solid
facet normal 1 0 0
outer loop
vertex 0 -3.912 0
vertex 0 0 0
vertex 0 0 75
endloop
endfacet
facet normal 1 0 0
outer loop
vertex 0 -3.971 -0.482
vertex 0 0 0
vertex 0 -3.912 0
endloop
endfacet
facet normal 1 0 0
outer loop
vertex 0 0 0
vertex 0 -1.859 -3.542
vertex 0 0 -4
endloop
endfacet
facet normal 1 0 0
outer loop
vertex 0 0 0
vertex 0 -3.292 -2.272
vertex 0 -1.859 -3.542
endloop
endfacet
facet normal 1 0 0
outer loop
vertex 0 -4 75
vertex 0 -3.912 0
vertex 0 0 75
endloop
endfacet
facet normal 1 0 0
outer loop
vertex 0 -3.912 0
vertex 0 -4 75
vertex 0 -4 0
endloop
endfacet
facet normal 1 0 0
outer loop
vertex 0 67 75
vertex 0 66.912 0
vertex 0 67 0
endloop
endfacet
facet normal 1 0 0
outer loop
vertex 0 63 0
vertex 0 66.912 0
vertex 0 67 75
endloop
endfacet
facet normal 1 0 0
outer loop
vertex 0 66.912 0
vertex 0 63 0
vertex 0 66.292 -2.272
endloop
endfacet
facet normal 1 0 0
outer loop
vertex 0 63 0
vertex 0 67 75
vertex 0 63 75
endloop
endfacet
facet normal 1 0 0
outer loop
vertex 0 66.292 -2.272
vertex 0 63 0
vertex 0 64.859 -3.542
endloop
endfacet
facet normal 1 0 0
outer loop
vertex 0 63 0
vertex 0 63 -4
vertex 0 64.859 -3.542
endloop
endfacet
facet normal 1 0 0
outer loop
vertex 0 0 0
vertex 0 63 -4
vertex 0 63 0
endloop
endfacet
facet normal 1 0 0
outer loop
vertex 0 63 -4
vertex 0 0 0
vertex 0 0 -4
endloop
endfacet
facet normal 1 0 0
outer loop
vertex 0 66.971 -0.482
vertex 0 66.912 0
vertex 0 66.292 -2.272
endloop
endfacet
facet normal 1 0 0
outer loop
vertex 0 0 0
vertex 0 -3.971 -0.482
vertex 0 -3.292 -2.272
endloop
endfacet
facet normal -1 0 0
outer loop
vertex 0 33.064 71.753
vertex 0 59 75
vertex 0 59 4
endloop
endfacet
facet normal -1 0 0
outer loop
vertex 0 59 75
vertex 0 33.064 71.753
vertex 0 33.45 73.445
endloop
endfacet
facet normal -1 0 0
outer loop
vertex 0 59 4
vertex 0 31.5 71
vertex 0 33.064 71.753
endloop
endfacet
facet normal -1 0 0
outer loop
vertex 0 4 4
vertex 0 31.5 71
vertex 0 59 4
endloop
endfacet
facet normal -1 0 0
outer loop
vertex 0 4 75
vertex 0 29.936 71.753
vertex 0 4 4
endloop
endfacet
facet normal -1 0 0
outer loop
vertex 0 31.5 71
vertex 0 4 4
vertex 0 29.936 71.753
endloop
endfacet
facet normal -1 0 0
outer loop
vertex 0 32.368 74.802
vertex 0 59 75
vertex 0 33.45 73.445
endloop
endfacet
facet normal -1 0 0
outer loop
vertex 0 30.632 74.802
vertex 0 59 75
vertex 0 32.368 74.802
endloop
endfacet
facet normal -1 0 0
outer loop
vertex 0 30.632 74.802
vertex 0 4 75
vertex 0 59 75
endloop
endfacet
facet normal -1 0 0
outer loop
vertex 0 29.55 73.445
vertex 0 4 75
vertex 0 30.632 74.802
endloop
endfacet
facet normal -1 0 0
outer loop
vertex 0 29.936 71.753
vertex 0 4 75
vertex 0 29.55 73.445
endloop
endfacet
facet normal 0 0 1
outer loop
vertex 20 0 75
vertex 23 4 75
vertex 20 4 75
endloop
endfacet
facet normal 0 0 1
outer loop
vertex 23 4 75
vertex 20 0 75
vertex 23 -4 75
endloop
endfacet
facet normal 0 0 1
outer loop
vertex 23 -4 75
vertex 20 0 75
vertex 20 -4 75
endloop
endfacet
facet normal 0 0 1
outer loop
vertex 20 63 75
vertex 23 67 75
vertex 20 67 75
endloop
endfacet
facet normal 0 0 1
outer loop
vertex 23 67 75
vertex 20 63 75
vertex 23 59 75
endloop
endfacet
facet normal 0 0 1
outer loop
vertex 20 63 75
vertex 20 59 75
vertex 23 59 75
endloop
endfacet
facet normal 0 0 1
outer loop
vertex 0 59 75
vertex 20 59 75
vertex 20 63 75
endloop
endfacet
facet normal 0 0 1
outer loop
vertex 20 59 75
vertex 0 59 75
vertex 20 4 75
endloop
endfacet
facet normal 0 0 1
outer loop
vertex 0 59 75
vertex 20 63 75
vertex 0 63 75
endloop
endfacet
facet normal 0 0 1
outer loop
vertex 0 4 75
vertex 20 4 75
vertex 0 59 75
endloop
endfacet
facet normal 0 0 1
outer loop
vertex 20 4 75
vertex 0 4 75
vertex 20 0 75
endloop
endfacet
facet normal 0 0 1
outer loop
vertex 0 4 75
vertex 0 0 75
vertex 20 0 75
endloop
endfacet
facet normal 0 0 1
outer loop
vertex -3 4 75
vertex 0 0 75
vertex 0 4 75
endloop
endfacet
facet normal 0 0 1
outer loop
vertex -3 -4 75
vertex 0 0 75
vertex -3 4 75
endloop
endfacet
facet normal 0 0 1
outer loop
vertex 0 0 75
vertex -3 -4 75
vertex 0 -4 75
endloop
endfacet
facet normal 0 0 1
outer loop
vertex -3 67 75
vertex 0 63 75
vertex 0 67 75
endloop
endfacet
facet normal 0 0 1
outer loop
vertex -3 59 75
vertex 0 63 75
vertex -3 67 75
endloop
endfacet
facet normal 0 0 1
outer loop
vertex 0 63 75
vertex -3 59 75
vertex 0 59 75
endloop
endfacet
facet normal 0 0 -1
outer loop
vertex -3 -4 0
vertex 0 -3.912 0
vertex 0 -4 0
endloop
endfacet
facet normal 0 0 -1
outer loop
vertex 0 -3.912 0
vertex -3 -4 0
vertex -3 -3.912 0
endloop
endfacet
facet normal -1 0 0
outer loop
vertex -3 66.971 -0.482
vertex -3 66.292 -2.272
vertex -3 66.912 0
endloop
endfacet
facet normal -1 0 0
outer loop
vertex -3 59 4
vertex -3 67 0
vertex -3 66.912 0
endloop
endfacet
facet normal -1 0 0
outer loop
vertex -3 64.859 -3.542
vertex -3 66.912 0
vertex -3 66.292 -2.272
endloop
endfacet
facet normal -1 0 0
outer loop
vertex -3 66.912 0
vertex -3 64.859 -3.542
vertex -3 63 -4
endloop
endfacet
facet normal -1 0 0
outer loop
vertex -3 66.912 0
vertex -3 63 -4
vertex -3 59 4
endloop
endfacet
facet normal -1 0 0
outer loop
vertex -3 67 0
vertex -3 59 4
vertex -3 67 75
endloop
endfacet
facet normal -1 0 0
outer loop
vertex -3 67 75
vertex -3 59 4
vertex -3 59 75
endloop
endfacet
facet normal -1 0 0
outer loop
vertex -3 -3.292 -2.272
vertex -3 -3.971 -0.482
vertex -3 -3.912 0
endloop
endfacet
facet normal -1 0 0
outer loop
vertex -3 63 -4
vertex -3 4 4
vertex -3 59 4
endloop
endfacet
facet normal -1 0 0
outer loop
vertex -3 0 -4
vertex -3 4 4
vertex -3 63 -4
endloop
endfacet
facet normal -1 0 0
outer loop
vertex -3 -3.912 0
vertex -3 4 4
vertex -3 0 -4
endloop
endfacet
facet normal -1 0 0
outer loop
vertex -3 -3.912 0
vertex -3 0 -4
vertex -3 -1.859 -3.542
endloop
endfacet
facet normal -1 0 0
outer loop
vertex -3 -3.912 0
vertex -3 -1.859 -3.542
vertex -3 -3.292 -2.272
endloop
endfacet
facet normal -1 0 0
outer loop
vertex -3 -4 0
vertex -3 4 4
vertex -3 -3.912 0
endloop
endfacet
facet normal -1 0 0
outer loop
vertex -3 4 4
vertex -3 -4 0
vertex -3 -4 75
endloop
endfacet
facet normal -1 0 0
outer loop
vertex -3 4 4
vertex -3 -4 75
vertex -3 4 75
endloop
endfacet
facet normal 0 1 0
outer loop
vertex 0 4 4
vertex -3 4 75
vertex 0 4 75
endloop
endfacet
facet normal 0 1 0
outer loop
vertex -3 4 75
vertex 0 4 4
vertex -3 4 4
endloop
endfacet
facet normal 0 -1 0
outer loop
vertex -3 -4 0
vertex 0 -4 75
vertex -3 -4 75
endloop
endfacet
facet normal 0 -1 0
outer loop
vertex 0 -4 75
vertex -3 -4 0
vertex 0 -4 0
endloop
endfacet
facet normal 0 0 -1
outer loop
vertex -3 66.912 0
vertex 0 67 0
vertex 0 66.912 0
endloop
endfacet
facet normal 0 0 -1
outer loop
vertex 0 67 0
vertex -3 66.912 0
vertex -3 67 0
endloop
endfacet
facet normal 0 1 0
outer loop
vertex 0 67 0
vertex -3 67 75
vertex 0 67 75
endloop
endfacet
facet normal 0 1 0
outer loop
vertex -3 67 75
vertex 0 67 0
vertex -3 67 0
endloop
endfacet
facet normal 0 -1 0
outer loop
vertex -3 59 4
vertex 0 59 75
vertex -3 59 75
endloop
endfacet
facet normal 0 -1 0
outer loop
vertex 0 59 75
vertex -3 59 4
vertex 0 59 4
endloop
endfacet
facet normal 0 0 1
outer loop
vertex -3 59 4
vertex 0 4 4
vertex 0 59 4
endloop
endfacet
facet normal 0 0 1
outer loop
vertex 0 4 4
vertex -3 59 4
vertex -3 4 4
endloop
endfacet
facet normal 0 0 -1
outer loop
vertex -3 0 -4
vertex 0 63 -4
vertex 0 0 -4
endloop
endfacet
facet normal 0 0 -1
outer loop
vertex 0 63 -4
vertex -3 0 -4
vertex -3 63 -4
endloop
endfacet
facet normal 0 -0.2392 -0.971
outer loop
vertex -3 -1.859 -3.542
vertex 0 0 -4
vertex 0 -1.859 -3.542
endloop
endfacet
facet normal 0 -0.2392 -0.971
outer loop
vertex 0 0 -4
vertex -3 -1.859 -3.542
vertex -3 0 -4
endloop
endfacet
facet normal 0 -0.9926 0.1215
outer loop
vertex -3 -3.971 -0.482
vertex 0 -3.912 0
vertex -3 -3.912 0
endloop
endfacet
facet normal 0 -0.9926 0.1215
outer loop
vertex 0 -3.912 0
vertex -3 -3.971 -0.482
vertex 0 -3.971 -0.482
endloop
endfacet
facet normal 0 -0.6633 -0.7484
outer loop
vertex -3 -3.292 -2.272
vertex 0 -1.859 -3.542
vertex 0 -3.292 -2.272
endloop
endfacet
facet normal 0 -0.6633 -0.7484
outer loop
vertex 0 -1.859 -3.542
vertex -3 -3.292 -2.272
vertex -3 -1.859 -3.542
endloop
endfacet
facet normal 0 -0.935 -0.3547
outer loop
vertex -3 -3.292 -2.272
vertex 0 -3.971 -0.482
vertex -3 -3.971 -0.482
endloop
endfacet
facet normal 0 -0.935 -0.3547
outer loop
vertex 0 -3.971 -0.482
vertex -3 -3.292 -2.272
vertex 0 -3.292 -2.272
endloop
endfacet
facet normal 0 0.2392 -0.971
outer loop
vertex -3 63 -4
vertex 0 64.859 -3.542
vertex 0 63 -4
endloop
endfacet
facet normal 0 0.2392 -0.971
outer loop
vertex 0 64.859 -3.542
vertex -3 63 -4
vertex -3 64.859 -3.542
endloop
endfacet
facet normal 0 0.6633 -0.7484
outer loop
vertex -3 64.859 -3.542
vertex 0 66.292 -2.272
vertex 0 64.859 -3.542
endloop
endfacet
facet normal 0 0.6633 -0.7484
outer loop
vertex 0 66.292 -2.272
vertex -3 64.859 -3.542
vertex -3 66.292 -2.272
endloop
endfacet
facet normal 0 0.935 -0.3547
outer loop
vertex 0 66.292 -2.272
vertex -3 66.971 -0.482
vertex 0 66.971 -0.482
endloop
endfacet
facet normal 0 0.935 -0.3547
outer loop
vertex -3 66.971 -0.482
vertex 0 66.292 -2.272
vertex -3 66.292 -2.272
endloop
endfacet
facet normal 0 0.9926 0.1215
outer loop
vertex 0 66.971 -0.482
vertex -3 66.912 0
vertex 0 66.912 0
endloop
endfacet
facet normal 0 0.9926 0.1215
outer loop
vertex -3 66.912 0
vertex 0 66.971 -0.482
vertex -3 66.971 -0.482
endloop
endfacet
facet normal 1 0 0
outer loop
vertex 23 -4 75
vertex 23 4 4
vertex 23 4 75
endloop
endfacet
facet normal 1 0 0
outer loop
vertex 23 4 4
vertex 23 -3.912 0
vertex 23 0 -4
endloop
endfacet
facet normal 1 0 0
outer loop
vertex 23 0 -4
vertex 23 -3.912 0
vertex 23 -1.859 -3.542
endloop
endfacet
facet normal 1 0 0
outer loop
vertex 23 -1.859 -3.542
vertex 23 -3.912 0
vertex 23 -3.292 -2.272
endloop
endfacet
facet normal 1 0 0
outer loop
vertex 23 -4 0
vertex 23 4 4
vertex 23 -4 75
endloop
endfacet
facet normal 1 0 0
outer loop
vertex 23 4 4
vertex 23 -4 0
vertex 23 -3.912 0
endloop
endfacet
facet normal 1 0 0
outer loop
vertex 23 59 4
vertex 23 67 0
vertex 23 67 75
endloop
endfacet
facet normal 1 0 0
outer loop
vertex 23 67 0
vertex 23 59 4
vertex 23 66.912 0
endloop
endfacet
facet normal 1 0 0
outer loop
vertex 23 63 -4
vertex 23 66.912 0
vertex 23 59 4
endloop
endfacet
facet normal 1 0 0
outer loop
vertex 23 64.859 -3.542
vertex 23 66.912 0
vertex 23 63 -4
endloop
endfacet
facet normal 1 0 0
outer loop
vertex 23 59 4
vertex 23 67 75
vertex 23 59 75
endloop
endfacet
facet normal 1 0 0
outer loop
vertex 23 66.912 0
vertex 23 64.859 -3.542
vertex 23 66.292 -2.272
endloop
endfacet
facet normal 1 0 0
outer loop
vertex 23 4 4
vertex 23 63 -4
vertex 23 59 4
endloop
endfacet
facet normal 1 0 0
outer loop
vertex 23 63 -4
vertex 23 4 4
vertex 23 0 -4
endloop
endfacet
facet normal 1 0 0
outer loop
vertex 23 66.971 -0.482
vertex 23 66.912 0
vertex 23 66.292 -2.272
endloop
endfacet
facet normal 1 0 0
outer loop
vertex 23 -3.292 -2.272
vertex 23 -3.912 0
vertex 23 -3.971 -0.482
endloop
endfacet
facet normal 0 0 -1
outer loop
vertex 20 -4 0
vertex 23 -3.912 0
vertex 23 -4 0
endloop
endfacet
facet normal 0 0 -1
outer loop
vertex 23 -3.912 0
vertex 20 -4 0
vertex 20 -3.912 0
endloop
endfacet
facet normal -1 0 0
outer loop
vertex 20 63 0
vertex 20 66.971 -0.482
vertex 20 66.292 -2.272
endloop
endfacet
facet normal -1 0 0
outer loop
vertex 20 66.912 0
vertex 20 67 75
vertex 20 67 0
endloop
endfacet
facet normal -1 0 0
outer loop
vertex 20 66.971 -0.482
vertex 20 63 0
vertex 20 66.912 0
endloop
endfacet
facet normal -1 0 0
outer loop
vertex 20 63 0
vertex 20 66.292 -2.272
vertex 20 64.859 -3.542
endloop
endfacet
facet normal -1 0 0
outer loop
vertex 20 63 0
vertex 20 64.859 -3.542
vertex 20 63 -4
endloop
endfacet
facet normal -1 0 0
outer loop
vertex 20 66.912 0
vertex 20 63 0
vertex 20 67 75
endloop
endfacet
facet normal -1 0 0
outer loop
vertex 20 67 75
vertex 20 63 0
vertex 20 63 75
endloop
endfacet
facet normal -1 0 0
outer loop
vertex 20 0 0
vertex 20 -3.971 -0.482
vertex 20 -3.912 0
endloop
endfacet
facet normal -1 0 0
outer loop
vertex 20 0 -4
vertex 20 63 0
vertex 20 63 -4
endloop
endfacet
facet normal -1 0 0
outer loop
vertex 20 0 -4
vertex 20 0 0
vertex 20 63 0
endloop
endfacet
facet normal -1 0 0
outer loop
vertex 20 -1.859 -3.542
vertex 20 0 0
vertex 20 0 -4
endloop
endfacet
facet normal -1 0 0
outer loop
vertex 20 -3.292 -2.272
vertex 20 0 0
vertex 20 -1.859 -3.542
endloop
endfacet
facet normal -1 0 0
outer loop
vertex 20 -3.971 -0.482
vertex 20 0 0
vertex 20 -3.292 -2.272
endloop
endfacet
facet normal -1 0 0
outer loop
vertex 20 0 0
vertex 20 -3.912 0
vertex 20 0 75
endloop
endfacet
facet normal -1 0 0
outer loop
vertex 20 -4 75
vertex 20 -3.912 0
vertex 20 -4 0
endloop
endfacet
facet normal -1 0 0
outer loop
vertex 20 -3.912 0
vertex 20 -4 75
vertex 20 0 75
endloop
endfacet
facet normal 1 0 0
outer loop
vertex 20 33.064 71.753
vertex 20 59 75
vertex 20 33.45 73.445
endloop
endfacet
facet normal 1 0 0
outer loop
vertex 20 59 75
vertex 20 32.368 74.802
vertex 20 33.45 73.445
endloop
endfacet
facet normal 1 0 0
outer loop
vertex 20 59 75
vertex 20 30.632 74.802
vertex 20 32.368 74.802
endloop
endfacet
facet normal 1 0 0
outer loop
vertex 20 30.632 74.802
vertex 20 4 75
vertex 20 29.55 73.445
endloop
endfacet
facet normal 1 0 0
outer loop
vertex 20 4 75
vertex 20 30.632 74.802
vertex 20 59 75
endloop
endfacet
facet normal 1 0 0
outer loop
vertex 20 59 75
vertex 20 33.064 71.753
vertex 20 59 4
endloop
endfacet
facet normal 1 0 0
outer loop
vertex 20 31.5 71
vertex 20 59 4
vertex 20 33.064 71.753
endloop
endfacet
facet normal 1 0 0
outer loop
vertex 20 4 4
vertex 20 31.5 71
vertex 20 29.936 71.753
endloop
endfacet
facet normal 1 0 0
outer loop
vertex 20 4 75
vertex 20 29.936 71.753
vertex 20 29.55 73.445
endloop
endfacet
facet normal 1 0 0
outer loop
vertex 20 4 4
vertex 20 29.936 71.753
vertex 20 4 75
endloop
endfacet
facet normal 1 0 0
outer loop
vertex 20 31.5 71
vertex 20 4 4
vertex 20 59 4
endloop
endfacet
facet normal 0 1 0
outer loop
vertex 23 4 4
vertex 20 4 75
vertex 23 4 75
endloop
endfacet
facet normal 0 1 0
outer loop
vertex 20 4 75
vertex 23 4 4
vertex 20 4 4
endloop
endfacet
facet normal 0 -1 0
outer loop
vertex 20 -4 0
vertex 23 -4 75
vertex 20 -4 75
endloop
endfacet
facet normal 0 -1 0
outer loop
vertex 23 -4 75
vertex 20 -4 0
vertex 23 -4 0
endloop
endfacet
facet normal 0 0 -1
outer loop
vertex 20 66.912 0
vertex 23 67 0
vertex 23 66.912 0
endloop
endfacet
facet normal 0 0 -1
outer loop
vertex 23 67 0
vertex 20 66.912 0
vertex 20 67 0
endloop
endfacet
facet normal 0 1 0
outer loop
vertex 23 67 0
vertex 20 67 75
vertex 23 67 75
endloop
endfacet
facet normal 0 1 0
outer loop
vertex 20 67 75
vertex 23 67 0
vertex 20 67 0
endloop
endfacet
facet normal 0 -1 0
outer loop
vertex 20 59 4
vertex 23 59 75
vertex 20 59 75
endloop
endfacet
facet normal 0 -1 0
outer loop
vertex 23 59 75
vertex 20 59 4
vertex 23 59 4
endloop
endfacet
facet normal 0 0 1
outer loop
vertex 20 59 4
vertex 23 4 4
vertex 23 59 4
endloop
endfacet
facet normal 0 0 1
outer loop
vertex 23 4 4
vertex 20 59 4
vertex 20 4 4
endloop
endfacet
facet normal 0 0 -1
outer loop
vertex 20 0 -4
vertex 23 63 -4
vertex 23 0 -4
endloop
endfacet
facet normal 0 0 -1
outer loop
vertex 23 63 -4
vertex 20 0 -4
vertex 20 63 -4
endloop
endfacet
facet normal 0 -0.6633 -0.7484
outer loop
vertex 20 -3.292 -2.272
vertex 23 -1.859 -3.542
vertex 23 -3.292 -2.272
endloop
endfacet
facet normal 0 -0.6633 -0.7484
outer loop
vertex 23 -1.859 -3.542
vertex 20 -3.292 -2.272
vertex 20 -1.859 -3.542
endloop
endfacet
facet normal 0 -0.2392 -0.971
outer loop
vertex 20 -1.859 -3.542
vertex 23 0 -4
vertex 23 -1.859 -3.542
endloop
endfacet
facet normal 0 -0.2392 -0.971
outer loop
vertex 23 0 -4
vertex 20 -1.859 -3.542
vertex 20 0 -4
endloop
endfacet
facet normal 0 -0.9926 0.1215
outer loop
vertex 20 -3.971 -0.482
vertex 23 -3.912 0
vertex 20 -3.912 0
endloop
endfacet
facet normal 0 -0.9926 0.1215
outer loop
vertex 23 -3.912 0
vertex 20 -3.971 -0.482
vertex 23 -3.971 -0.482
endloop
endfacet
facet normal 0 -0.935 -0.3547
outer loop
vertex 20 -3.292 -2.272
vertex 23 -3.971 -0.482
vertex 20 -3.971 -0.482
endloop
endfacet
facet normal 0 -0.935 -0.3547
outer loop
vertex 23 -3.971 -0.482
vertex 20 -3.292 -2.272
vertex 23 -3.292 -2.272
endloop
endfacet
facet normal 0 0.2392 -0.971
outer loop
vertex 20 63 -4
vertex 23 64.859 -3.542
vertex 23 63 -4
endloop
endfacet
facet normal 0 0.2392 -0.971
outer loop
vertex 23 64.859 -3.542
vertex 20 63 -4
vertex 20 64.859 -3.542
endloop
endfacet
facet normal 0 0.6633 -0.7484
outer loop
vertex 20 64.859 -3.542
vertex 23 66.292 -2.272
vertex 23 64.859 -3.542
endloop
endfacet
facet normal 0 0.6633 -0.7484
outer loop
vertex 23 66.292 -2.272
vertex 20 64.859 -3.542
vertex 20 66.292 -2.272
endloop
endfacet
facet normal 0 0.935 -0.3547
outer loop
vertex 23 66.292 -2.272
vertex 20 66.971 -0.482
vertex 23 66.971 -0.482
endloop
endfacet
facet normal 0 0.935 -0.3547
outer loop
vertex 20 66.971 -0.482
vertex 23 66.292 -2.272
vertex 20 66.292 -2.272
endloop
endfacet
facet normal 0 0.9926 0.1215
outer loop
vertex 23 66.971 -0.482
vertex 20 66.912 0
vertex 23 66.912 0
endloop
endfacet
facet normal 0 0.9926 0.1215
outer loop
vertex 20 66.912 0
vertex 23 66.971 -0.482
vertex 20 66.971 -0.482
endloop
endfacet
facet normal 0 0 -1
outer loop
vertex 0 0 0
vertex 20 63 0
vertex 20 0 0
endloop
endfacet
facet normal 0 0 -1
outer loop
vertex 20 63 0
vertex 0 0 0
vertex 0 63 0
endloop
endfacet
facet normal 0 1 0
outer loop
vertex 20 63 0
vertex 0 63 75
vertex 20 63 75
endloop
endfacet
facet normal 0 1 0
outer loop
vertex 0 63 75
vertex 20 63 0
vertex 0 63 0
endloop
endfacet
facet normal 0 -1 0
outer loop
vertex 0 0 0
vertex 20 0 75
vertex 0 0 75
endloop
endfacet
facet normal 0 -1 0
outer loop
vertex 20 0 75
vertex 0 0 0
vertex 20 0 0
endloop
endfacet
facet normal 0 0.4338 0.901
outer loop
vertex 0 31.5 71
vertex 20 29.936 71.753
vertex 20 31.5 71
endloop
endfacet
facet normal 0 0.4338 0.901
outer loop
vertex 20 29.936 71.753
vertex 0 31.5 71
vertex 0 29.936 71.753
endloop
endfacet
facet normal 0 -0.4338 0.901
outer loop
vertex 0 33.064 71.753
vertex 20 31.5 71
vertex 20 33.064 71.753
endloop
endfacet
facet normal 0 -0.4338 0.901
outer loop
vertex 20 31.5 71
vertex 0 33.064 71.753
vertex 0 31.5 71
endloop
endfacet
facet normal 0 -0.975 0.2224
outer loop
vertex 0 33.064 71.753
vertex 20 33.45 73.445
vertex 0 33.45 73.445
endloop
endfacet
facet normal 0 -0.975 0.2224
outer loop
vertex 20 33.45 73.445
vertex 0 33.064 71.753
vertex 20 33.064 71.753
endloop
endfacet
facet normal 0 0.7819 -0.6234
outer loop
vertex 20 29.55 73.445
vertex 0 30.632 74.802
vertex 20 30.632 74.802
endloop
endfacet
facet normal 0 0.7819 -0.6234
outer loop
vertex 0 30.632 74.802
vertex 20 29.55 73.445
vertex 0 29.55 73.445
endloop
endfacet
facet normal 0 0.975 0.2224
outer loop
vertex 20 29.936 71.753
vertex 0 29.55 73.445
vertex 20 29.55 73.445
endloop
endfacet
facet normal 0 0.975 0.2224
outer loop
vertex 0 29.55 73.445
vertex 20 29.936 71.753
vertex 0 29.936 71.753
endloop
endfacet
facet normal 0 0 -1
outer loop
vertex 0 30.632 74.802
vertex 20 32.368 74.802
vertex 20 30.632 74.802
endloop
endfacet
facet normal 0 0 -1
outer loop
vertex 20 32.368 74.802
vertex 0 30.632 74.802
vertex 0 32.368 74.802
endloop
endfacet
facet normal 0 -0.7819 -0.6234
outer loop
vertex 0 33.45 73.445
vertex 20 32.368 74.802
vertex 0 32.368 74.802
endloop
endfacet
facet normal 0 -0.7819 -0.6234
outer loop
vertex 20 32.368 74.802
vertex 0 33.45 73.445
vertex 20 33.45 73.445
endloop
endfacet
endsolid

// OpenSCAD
// Cable route for guns
$fa = 6;
// Variables
// all measurements in mm
gapWidth = 63;
gapHeight = 75;
cableDia = 4;
mediaThickness = 20;
overhang = 4;
gripWidth = 3;

// This is the base
difference()
{
    union()
    {
        cube([mediaThickness, gapWidth, gapHeight]);
        lips();
    }
    translate([0,gapWidth/2,gapHeight - (cableDia/2)])
    {
        rotate(a=[0,90,0])
        {
            cylinder(h=mediaThickness, d=cableDia);
        }
    }
}

module lips()
{
    singleLip();
    translate([mediaThickness + gripWidth, 0, 0])
    {
        singleLip();
    }
}

module singleLip()
{
    translate([-gripWidth,-overhang,0])
    {
        cube([gripWidth, overhang*2, gapHeight]);
    }
    translate([-gripWidth,gapWidth - overhang,0])
    {
        cube([gripWidth, overhang*2, gapHeight]);
    }
    translate([-gripWidth, 0, -overhang])
    {
        cube([gripWidth, gapWidth, overhang*2]);
    }
    translate([-gripWidth,0,0])
    {
        rotate(a=[0,90,0])
        {
            cylinder(h=gripWidth, r=overhang);
        }
    }
    translate([-gripWidth,gapWidth,0])
    {
        rotate(a=[0,90,0])
        {
            cylinder(h=gripWidth, r=overhang);
        }
    }
}
